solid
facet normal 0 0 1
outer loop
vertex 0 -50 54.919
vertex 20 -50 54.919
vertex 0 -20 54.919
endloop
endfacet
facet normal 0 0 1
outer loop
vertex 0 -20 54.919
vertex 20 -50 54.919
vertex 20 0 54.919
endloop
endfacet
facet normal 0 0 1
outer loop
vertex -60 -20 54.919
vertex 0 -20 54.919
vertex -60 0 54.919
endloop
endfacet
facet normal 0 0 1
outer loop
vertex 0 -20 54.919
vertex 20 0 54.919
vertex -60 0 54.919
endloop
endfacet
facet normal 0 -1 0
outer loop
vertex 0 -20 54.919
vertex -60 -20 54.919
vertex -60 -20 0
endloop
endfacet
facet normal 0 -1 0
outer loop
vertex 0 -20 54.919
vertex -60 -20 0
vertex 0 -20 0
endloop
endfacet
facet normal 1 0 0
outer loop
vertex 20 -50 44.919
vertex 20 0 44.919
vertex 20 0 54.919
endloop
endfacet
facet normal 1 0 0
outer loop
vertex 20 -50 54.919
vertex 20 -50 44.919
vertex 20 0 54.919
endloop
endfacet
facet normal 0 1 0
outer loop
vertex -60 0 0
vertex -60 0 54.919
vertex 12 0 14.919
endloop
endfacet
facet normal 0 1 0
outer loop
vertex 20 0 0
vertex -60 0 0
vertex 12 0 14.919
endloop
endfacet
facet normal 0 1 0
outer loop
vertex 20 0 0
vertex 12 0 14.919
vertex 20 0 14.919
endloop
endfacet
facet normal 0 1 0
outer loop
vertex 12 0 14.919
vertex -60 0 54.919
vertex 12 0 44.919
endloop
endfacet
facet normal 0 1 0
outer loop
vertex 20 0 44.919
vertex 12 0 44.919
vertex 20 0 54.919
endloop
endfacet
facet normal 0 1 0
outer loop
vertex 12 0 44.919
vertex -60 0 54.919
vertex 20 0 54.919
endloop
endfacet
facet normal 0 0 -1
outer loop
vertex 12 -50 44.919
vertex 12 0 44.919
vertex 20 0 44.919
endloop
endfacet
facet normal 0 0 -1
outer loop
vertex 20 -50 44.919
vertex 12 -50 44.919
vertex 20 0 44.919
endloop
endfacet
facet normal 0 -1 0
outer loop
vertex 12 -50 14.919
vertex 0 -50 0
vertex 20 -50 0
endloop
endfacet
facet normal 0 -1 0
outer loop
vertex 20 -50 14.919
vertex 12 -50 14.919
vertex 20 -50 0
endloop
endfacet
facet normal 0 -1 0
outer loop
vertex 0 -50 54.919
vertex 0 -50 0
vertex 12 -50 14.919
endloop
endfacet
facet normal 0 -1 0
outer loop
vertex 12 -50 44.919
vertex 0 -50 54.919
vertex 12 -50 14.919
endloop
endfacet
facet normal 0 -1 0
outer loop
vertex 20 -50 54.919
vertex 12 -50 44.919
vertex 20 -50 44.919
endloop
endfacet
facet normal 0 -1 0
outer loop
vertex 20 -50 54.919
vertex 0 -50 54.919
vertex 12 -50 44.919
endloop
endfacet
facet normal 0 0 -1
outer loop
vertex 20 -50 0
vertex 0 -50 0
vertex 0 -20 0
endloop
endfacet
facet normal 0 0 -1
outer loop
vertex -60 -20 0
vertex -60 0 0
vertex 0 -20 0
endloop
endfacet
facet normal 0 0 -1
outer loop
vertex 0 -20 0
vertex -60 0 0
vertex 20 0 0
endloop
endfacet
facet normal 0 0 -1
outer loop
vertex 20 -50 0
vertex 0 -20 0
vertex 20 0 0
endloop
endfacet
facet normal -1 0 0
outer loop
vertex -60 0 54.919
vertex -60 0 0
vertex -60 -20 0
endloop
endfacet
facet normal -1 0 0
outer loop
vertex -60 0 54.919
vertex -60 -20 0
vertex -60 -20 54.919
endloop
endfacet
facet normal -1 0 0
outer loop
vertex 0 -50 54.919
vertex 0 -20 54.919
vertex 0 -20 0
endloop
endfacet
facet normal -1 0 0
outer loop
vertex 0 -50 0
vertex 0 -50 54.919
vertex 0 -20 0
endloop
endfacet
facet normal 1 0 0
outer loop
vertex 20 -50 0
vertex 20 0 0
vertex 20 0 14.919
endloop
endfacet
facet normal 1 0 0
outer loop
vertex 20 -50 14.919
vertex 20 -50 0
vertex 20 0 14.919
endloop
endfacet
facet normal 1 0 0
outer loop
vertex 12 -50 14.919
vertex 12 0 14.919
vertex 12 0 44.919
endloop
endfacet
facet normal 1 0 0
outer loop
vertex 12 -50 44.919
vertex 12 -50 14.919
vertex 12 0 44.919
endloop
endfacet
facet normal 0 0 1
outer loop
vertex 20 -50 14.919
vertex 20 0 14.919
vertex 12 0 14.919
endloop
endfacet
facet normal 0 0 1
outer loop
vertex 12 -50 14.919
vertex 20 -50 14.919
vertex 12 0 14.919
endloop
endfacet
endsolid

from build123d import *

# Parameters (mm, degrees)
F0_W     = 60
F0_H     = 54.918804
F1_DEPTH = 20
F2_DEPTH = 50


with BuildPart() as f1:
    # F0 (on Front) → F1 (new body)
    with BuildSketch(Plane.XZ):
        with Locations((-30, 27.459402)):
            Rectangle(F0_W, F0_H)
    extrude(amount=F1_DEPTH)

    # F0 (on Front) → F2 (join)
    with BuildSketch(Plane.XZ):
        Polygon((0, 54.918804), (0, 0), (20, 0), (20, 14.918804), (12, 14.918804), (12, 44.918804), (20, 44.918804), (20, 54.918804), align=None)
    extrude(amount=F2_DEPTH)


solid = f1.part
